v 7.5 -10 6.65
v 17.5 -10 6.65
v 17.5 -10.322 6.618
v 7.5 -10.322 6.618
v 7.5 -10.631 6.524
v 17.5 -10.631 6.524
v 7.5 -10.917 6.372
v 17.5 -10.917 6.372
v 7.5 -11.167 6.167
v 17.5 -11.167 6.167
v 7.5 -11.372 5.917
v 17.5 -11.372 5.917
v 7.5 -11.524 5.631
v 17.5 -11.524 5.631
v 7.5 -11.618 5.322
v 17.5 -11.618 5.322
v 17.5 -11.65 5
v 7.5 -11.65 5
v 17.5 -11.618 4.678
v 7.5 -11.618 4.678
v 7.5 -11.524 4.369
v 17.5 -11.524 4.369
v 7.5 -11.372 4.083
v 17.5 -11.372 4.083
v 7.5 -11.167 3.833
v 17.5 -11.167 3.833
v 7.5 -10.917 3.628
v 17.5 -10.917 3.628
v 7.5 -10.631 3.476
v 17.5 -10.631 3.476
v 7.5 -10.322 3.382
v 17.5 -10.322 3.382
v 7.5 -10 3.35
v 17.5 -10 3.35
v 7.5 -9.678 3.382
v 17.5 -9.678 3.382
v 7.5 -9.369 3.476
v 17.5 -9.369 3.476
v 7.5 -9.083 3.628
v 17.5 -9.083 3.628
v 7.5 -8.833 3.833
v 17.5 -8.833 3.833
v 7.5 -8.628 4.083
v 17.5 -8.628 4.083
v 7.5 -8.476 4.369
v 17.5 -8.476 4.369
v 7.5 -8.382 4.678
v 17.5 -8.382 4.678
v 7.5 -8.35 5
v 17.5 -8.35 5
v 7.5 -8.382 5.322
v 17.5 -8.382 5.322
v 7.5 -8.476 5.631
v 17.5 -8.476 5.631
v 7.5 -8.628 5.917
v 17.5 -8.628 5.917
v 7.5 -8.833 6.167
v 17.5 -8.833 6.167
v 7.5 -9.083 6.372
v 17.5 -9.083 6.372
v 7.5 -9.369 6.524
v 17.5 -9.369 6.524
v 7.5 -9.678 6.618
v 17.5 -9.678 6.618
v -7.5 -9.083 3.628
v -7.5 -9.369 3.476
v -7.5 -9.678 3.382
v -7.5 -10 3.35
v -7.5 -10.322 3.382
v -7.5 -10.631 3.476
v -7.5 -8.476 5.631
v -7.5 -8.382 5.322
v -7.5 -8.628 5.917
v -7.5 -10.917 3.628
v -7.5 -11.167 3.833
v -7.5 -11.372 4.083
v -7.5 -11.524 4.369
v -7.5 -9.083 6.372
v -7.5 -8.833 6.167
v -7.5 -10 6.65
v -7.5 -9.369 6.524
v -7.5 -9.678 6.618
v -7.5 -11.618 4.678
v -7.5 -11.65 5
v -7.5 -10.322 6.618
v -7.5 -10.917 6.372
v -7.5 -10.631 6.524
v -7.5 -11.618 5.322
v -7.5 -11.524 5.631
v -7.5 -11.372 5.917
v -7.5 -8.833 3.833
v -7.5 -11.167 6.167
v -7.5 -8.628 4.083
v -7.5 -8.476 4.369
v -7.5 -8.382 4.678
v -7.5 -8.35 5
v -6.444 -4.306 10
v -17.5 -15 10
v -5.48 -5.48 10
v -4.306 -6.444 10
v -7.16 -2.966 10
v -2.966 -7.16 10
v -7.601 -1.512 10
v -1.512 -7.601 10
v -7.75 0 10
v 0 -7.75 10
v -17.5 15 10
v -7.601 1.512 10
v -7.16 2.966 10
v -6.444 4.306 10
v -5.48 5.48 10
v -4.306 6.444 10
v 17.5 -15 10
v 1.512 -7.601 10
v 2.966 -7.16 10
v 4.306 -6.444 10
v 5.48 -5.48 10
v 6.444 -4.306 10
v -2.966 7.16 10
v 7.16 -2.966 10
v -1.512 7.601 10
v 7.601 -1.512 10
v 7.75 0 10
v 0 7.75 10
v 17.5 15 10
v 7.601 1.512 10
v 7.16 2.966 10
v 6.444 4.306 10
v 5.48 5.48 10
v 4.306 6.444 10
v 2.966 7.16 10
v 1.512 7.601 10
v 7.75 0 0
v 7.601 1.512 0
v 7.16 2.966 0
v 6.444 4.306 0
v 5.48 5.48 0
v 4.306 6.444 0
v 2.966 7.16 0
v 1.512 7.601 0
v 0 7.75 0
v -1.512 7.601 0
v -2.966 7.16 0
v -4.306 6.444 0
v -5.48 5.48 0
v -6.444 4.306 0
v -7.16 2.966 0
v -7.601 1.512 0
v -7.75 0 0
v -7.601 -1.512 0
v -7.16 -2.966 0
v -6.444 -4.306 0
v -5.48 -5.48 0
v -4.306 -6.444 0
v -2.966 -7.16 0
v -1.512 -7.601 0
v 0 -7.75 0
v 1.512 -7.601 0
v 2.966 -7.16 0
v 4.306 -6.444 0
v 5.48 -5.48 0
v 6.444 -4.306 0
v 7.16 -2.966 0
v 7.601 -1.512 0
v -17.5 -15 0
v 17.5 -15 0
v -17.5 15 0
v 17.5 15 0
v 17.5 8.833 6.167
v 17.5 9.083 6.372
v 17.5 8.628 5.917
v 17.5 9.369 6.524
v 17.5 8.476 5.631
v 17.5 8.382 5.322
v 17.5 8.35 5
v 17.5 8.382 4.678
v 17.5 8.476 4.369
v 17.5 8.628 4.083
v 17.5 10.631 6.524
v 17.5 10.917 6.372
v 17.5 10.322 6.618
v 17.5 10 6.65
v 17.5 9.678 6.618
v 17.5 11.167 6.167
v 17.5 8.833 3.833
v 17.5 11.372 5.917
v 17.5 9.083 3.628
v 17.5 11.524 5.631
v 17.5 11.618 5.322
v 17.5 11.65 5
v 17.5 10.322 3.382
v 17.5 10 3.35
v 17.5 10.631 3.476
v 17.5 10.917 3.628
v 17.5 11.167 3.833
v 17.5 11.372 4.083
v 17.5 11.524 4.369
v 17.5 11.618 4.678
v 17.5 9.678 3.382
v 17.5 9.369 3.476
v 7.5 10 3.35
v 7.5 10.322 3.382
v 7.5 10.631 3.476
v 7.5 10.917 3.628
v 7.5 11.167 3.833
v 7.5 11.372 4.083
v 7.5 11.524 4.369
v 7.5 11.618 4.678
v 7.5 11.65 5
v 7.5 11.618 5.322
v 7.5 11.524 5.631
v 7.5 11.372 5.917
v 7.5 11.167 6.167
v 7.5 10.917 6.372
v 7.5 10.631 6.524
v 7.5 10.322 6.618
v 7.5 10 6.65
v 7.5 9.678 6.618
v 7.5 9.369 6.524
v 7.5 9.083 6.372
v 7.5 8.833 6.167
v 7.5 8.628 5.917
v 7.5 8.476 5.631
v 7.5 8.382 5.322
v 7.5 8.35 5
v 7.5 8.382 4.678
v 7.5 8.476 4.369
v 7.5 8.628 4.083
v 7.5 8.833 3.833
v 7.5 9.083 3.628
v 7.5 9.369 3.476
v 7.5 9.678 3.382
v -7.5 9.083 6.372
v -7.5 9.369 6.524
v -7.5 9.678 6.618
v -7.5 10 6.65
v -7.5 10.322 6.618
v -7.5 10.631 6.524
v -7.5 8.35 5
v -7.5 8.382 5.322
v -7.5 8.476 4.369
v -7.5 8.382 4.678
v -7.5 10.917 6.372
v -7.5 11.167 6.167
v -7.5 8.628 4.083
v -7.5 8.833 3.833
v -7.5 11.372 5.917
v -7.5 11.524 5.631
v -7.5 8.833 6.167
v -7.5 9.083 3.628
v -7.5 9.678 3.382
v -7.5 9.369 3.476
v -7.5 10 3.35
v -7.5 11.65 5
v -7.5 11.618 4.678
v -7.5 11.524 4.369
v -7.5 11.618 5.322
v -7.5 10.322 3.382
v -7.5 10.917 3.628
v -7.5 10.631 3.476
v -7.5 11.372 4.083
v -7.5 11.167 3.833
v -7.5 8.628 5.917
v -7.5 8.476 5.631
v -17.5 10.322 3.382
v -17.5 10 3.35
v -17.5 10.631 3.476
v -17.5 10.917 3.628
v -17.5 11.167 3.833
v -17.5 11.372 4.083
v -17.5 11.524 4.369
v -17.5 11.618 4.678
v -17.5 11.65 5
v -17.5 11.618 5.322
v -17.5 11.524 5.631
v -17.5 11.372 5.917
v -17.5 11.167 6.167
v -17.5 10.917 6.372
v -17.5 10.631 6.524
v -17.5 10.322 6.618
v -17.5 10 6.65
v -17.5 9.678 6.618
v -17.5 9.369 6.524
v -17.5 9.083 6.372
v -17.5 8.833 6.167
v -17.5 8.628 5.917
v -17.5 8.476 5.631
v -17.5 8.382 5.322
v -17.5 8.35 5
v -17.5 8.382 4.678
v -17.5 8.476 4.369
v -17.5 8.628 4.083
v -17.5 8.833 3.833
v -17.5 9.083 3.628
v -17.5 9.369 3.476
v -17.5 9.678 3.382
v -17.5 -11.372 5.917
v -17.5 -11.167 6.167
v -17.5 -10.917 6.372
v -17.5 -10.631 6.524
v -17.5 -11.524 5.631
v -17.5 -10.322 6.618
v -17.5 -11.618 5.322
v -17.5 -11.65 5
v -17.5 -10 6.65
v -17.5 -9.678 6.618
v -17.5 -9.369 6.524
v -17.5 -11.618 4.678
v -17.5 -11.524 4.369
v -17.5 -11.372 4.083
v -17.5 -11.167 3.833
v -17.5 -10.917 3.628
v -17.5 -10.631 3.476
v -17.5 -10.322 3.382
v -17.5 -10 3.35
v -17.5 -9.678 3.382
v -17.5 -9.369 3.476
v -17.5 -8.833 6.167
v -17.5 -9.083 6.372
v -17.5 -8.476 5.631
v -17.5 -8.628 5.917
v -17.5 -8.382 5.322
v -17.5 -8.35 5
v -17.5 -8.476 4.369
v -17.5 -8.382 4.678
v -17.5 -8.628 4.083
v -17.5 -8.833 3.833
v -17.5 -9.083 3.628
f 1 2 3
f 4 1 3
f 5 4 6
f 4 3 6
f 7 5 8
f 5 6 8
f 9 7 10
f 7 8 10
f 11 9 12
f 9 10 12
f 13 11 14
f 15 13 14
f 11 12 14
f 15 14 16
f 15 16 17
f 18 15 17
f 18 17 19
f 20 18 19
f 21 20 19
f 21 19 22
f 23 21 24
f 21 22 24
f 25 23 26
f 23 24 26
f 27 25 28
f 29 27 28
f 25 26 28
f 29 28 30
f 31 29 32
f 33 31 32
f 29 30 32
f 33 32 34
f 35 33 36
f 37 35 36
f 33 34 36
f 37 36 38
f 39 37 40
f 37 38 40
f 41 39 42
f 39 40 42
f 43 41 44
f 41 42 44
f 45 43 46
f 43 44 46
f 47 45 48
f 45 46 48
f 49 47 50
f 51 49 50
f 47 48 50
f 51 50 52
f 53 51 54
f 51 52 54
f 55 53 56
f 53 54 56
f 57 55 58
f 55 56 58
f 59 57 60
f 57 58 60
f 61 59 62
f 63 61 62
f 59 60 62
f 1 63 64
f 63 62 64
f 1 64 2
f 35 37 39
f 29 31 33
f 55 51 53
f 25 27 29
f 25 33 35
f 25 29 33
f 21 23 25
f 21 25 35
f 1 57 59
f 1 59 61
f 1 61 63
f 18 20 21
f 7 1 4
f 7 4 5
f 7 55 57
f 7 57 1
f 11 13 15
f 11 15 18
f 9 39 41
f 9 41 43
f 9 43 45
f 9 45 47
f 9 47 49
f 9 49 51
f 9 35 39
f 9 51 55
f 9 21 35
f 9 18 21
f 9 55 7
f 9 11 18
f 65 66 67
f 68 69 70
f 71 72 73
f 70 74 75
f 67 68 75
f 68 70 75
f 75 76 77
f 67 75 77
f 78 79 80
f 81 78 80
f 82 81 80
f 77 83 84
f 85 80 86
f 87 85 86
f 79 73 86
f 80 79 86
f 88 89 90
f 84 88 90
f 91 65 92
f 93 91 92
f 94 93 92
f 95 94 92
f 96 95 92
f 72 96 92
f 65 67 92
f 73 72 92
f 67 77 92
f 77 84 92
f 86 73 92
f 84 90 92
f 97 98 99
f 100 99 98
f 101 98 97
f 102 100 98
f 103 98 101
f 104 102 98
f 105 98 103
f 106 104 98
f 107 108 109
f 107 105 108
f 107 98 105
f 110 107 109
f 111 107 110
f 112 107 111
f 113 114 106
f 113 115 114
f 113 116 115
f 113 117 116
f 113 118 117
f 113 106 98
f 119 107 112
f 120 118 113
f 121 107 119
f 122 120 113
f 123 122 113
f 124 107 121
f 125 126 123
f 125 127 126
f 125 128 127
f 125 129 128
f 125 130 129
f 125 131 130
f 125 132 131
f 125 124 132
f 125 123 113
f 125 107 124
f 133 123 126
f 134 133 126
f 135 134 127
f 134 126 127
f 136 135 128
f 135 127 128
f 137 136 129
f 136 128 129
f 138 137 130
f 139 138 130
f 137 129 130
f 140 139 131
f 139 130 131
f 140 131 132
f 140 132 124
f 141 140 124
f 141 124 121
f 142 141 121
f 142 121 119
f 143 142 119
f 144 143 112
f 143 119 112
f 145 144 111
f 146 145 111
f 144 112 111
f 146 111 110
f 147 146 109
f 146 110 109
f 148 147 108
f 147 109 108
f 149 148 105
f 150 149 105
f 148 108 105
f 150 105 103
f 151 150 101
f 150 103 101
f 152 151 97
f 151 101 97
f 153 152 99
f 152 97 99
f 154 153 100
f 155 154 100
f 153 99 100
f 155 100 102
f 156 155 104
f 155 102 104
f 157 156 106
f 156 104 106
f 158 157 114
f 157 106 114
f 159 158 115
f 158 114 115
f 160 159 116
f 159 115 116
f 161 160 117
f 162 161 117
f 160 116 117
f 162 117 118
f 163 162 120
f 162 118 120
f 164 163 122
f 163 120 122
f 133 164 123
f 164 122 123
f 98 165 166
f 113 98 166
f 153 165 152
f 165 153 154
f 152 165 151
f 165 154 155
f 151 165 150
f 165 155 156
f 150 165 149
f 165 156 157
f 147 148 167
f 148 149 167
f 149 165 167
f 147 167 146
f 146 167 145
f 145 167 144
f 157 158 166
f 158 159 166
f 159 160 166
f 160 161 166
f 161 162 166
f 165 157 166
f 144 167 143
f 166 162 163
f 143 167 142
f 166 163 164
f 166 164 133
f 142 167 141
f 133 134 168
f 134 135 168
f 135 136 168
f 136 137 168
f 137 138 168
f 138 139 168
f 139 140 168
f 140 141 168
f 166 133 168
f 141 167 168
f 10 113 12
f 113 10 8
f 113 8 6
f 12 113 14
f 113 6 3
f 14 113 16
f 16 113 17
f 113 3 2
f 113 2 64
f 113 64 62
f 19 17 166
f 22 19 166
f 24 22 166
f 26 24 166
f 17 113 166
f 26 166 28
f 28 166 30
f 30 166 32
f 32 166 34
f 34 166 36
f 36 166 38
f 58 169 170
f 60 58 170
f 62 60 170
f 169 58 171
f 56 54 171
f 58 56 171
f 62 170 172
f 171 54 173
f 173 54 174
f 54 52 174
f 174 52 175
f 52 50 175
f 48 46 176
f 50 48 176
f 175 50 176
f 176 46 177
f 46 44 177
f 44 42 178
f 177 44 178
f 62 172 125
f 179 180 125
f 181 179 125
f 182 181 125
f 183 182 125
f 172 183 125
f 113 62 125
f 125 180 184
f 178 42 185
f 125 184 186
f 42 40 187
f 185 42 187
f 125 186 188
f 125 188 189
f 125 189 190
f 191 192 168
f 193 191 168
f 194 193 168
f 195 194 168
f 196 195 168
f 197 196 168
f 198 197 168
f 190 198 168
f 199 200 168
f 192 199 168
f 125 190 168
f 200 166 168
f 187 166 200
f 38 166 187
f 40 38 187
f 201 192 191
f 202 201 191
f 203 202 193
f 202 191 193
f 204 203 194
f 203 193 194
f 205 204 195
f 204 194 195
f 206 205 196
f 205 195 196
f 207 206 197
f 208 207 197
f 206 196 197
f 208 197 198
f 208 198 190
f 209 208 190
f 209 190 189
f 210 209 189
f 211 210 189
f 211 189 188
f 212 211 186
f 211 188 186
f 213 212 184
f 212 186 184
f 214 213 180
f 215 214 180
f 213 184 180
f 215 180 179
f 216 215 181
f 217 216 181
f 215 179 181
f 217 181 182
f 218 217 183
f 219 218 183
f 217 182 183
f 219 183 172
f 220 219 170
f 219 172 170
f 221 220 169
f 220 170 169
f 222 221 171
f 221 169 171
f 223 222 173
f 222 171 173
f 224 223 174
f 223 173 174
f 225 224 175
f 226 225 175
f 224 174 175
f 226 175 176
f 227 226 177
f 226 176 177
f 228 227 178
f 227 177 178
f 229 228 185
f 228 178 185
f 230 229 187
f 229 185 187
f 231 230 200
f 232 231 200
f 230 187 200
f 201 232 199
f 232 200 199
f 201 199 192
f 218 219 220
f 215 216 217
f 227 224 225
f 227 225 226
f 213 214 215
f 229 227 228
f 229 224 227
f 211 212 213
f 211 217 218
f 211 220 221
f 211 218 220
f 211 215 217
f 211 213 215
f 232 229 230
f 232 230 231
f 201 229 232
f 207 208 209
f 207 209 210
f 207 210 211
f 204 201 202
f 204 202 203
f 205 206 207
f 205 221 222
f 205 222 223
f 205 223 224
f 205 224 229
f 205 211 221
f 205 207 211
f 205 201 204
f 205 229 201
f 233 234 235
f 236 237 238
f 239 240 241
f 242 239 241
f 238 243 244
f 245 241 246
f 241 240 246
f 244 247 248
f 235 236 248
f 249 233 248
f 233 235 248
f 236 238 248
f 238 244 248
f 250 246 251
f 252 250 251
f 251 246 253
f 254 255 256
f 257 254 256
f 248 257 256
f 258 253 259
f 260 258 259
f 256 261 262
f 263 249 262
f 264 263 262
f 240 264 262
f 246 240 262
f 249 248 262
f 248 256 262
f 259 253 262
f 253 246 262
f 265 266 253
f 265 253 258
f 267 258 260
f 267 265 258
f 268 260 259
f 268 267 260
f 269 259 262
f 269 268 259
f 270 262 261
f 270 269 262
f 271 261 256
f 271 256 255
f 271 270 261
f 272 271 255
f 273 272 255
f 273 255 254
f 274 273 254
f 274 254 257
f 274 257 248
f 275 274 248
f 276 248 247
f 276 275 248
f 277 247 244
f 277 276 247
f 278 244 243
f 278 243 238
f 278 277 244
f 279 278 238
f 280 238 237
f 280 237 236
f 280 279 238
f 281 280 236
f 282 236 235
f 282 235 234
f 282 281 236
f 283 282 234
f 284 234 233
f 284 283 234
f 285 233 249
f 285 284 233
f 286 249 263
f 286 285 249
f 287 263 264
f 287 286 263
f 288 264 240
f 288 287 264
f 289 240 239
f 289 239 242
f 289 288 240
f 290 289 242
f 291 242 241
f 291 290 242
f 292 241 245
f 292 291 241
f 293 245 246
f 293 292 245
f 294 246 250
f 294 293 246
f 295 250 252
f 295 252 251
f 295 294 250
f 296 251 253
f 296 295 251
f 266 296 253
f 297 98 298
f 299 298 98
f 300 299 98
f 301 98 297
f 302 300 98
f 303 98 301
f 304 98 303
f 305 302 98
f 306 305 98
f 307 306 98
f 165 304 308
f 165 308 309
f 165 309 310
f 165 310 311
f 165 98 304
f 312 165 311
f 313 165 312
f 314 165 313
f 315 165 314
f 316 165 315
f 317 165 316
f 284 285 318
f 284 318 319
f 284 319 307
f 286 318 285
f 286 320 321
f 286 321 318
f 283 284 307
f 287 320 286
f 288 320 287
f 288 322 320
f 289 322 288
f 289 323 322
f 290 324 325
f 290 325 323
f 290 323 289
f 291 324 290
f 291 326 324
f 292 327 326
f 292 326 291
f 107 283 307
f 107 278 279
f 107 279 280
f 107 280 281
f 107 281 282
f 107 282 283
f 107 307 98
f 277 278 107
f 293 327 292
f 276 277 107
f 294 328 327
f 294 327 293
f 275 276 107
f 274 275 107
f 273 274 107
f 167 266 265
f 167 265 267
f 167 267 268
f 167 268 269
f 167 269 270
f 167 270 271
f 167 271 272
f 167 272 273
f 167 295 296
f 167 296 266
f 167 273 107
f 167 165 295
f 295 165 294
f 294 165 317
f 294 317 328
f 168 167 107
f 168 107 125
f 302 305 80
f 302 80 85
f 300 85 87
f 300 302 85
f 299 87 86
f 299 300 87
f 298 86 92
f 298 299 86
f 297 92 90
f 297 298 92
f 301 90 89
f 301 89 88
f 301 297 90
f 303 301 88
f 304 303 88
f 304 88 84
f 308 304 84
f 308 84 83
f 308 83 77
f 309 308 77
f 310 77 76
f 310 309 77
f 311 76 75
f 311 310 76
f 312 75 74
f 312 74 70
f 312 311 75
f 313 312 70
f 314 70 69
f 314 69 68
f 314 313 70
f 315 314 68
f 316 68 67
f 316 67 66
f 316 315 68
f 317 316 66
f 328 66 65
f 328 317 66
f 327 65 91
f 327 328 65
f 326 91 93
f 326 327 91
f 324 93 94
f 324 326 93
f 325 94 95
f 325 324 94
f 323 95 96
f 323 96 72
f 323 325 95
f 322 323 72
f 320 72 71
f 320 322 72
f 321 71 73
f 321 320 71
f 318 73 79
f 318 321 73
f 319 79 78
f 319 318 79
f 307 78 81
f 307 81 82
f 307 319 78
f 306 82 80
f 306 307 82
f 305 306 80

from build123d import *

# Parameters (mm, degrees)
SKETCH1_W           = 35
SKETCH1_H           = 30
BOSS_EXTRUDE1_DEPTH = 10
SKETCH2_R           = 7.75
CUT_EXTRUDE1_DEPTH  = 10
SKETCH3_R           = 1.65
CUT_EXTRUDE2_DEPTH  = 10


with BuildPart() as part:
    # Sketch1 → Boss-Extrude1 (new body)
    with BuildSketch(Plane.XY):
        Rectangle(SKETCH1_W, SKETCH1_H)
    extrude(amount=BOSS_EXTRUDE1_DEPTH)

    # Sketch2 → Cut-Extrude1 (cut)
    with BuildSketch(Plane.XY.offset(10)):
        Circle(SKETCH2_R)
    extrude(amount=-CUT_EXTRUDE1_DEPTH, mode=Mode.SUBTRACT)

    # Sketch3 → Cut-Extrude2 (cut)
    with BuildSketch(Plane(origin=(17.5, 0, 0), x_dir=(0, 0, -1), z_dir=(1, 0, 0))):
        with Locations((-5, 10)):
            Circle(SKETCH3_R)
        with Locations(Location((-5, -10, 0), (0, 0, 180))):
            Circle(SKETCH3_R)
    cut_extrude2 = extrude(amount=-CUT_EXTRUDE2_DEPTH, mode=Mode.SUBTRACT)

    # Mirror1: Cut-Extrude2 across plane
    add(cut_extrude2.mirror(Plane(origin=(0, 0, 0), x_dir=(0, 0, 1), z_dir=(1, 0, 0))), mode=Mode.SUBTRACT)


solid = part.part
